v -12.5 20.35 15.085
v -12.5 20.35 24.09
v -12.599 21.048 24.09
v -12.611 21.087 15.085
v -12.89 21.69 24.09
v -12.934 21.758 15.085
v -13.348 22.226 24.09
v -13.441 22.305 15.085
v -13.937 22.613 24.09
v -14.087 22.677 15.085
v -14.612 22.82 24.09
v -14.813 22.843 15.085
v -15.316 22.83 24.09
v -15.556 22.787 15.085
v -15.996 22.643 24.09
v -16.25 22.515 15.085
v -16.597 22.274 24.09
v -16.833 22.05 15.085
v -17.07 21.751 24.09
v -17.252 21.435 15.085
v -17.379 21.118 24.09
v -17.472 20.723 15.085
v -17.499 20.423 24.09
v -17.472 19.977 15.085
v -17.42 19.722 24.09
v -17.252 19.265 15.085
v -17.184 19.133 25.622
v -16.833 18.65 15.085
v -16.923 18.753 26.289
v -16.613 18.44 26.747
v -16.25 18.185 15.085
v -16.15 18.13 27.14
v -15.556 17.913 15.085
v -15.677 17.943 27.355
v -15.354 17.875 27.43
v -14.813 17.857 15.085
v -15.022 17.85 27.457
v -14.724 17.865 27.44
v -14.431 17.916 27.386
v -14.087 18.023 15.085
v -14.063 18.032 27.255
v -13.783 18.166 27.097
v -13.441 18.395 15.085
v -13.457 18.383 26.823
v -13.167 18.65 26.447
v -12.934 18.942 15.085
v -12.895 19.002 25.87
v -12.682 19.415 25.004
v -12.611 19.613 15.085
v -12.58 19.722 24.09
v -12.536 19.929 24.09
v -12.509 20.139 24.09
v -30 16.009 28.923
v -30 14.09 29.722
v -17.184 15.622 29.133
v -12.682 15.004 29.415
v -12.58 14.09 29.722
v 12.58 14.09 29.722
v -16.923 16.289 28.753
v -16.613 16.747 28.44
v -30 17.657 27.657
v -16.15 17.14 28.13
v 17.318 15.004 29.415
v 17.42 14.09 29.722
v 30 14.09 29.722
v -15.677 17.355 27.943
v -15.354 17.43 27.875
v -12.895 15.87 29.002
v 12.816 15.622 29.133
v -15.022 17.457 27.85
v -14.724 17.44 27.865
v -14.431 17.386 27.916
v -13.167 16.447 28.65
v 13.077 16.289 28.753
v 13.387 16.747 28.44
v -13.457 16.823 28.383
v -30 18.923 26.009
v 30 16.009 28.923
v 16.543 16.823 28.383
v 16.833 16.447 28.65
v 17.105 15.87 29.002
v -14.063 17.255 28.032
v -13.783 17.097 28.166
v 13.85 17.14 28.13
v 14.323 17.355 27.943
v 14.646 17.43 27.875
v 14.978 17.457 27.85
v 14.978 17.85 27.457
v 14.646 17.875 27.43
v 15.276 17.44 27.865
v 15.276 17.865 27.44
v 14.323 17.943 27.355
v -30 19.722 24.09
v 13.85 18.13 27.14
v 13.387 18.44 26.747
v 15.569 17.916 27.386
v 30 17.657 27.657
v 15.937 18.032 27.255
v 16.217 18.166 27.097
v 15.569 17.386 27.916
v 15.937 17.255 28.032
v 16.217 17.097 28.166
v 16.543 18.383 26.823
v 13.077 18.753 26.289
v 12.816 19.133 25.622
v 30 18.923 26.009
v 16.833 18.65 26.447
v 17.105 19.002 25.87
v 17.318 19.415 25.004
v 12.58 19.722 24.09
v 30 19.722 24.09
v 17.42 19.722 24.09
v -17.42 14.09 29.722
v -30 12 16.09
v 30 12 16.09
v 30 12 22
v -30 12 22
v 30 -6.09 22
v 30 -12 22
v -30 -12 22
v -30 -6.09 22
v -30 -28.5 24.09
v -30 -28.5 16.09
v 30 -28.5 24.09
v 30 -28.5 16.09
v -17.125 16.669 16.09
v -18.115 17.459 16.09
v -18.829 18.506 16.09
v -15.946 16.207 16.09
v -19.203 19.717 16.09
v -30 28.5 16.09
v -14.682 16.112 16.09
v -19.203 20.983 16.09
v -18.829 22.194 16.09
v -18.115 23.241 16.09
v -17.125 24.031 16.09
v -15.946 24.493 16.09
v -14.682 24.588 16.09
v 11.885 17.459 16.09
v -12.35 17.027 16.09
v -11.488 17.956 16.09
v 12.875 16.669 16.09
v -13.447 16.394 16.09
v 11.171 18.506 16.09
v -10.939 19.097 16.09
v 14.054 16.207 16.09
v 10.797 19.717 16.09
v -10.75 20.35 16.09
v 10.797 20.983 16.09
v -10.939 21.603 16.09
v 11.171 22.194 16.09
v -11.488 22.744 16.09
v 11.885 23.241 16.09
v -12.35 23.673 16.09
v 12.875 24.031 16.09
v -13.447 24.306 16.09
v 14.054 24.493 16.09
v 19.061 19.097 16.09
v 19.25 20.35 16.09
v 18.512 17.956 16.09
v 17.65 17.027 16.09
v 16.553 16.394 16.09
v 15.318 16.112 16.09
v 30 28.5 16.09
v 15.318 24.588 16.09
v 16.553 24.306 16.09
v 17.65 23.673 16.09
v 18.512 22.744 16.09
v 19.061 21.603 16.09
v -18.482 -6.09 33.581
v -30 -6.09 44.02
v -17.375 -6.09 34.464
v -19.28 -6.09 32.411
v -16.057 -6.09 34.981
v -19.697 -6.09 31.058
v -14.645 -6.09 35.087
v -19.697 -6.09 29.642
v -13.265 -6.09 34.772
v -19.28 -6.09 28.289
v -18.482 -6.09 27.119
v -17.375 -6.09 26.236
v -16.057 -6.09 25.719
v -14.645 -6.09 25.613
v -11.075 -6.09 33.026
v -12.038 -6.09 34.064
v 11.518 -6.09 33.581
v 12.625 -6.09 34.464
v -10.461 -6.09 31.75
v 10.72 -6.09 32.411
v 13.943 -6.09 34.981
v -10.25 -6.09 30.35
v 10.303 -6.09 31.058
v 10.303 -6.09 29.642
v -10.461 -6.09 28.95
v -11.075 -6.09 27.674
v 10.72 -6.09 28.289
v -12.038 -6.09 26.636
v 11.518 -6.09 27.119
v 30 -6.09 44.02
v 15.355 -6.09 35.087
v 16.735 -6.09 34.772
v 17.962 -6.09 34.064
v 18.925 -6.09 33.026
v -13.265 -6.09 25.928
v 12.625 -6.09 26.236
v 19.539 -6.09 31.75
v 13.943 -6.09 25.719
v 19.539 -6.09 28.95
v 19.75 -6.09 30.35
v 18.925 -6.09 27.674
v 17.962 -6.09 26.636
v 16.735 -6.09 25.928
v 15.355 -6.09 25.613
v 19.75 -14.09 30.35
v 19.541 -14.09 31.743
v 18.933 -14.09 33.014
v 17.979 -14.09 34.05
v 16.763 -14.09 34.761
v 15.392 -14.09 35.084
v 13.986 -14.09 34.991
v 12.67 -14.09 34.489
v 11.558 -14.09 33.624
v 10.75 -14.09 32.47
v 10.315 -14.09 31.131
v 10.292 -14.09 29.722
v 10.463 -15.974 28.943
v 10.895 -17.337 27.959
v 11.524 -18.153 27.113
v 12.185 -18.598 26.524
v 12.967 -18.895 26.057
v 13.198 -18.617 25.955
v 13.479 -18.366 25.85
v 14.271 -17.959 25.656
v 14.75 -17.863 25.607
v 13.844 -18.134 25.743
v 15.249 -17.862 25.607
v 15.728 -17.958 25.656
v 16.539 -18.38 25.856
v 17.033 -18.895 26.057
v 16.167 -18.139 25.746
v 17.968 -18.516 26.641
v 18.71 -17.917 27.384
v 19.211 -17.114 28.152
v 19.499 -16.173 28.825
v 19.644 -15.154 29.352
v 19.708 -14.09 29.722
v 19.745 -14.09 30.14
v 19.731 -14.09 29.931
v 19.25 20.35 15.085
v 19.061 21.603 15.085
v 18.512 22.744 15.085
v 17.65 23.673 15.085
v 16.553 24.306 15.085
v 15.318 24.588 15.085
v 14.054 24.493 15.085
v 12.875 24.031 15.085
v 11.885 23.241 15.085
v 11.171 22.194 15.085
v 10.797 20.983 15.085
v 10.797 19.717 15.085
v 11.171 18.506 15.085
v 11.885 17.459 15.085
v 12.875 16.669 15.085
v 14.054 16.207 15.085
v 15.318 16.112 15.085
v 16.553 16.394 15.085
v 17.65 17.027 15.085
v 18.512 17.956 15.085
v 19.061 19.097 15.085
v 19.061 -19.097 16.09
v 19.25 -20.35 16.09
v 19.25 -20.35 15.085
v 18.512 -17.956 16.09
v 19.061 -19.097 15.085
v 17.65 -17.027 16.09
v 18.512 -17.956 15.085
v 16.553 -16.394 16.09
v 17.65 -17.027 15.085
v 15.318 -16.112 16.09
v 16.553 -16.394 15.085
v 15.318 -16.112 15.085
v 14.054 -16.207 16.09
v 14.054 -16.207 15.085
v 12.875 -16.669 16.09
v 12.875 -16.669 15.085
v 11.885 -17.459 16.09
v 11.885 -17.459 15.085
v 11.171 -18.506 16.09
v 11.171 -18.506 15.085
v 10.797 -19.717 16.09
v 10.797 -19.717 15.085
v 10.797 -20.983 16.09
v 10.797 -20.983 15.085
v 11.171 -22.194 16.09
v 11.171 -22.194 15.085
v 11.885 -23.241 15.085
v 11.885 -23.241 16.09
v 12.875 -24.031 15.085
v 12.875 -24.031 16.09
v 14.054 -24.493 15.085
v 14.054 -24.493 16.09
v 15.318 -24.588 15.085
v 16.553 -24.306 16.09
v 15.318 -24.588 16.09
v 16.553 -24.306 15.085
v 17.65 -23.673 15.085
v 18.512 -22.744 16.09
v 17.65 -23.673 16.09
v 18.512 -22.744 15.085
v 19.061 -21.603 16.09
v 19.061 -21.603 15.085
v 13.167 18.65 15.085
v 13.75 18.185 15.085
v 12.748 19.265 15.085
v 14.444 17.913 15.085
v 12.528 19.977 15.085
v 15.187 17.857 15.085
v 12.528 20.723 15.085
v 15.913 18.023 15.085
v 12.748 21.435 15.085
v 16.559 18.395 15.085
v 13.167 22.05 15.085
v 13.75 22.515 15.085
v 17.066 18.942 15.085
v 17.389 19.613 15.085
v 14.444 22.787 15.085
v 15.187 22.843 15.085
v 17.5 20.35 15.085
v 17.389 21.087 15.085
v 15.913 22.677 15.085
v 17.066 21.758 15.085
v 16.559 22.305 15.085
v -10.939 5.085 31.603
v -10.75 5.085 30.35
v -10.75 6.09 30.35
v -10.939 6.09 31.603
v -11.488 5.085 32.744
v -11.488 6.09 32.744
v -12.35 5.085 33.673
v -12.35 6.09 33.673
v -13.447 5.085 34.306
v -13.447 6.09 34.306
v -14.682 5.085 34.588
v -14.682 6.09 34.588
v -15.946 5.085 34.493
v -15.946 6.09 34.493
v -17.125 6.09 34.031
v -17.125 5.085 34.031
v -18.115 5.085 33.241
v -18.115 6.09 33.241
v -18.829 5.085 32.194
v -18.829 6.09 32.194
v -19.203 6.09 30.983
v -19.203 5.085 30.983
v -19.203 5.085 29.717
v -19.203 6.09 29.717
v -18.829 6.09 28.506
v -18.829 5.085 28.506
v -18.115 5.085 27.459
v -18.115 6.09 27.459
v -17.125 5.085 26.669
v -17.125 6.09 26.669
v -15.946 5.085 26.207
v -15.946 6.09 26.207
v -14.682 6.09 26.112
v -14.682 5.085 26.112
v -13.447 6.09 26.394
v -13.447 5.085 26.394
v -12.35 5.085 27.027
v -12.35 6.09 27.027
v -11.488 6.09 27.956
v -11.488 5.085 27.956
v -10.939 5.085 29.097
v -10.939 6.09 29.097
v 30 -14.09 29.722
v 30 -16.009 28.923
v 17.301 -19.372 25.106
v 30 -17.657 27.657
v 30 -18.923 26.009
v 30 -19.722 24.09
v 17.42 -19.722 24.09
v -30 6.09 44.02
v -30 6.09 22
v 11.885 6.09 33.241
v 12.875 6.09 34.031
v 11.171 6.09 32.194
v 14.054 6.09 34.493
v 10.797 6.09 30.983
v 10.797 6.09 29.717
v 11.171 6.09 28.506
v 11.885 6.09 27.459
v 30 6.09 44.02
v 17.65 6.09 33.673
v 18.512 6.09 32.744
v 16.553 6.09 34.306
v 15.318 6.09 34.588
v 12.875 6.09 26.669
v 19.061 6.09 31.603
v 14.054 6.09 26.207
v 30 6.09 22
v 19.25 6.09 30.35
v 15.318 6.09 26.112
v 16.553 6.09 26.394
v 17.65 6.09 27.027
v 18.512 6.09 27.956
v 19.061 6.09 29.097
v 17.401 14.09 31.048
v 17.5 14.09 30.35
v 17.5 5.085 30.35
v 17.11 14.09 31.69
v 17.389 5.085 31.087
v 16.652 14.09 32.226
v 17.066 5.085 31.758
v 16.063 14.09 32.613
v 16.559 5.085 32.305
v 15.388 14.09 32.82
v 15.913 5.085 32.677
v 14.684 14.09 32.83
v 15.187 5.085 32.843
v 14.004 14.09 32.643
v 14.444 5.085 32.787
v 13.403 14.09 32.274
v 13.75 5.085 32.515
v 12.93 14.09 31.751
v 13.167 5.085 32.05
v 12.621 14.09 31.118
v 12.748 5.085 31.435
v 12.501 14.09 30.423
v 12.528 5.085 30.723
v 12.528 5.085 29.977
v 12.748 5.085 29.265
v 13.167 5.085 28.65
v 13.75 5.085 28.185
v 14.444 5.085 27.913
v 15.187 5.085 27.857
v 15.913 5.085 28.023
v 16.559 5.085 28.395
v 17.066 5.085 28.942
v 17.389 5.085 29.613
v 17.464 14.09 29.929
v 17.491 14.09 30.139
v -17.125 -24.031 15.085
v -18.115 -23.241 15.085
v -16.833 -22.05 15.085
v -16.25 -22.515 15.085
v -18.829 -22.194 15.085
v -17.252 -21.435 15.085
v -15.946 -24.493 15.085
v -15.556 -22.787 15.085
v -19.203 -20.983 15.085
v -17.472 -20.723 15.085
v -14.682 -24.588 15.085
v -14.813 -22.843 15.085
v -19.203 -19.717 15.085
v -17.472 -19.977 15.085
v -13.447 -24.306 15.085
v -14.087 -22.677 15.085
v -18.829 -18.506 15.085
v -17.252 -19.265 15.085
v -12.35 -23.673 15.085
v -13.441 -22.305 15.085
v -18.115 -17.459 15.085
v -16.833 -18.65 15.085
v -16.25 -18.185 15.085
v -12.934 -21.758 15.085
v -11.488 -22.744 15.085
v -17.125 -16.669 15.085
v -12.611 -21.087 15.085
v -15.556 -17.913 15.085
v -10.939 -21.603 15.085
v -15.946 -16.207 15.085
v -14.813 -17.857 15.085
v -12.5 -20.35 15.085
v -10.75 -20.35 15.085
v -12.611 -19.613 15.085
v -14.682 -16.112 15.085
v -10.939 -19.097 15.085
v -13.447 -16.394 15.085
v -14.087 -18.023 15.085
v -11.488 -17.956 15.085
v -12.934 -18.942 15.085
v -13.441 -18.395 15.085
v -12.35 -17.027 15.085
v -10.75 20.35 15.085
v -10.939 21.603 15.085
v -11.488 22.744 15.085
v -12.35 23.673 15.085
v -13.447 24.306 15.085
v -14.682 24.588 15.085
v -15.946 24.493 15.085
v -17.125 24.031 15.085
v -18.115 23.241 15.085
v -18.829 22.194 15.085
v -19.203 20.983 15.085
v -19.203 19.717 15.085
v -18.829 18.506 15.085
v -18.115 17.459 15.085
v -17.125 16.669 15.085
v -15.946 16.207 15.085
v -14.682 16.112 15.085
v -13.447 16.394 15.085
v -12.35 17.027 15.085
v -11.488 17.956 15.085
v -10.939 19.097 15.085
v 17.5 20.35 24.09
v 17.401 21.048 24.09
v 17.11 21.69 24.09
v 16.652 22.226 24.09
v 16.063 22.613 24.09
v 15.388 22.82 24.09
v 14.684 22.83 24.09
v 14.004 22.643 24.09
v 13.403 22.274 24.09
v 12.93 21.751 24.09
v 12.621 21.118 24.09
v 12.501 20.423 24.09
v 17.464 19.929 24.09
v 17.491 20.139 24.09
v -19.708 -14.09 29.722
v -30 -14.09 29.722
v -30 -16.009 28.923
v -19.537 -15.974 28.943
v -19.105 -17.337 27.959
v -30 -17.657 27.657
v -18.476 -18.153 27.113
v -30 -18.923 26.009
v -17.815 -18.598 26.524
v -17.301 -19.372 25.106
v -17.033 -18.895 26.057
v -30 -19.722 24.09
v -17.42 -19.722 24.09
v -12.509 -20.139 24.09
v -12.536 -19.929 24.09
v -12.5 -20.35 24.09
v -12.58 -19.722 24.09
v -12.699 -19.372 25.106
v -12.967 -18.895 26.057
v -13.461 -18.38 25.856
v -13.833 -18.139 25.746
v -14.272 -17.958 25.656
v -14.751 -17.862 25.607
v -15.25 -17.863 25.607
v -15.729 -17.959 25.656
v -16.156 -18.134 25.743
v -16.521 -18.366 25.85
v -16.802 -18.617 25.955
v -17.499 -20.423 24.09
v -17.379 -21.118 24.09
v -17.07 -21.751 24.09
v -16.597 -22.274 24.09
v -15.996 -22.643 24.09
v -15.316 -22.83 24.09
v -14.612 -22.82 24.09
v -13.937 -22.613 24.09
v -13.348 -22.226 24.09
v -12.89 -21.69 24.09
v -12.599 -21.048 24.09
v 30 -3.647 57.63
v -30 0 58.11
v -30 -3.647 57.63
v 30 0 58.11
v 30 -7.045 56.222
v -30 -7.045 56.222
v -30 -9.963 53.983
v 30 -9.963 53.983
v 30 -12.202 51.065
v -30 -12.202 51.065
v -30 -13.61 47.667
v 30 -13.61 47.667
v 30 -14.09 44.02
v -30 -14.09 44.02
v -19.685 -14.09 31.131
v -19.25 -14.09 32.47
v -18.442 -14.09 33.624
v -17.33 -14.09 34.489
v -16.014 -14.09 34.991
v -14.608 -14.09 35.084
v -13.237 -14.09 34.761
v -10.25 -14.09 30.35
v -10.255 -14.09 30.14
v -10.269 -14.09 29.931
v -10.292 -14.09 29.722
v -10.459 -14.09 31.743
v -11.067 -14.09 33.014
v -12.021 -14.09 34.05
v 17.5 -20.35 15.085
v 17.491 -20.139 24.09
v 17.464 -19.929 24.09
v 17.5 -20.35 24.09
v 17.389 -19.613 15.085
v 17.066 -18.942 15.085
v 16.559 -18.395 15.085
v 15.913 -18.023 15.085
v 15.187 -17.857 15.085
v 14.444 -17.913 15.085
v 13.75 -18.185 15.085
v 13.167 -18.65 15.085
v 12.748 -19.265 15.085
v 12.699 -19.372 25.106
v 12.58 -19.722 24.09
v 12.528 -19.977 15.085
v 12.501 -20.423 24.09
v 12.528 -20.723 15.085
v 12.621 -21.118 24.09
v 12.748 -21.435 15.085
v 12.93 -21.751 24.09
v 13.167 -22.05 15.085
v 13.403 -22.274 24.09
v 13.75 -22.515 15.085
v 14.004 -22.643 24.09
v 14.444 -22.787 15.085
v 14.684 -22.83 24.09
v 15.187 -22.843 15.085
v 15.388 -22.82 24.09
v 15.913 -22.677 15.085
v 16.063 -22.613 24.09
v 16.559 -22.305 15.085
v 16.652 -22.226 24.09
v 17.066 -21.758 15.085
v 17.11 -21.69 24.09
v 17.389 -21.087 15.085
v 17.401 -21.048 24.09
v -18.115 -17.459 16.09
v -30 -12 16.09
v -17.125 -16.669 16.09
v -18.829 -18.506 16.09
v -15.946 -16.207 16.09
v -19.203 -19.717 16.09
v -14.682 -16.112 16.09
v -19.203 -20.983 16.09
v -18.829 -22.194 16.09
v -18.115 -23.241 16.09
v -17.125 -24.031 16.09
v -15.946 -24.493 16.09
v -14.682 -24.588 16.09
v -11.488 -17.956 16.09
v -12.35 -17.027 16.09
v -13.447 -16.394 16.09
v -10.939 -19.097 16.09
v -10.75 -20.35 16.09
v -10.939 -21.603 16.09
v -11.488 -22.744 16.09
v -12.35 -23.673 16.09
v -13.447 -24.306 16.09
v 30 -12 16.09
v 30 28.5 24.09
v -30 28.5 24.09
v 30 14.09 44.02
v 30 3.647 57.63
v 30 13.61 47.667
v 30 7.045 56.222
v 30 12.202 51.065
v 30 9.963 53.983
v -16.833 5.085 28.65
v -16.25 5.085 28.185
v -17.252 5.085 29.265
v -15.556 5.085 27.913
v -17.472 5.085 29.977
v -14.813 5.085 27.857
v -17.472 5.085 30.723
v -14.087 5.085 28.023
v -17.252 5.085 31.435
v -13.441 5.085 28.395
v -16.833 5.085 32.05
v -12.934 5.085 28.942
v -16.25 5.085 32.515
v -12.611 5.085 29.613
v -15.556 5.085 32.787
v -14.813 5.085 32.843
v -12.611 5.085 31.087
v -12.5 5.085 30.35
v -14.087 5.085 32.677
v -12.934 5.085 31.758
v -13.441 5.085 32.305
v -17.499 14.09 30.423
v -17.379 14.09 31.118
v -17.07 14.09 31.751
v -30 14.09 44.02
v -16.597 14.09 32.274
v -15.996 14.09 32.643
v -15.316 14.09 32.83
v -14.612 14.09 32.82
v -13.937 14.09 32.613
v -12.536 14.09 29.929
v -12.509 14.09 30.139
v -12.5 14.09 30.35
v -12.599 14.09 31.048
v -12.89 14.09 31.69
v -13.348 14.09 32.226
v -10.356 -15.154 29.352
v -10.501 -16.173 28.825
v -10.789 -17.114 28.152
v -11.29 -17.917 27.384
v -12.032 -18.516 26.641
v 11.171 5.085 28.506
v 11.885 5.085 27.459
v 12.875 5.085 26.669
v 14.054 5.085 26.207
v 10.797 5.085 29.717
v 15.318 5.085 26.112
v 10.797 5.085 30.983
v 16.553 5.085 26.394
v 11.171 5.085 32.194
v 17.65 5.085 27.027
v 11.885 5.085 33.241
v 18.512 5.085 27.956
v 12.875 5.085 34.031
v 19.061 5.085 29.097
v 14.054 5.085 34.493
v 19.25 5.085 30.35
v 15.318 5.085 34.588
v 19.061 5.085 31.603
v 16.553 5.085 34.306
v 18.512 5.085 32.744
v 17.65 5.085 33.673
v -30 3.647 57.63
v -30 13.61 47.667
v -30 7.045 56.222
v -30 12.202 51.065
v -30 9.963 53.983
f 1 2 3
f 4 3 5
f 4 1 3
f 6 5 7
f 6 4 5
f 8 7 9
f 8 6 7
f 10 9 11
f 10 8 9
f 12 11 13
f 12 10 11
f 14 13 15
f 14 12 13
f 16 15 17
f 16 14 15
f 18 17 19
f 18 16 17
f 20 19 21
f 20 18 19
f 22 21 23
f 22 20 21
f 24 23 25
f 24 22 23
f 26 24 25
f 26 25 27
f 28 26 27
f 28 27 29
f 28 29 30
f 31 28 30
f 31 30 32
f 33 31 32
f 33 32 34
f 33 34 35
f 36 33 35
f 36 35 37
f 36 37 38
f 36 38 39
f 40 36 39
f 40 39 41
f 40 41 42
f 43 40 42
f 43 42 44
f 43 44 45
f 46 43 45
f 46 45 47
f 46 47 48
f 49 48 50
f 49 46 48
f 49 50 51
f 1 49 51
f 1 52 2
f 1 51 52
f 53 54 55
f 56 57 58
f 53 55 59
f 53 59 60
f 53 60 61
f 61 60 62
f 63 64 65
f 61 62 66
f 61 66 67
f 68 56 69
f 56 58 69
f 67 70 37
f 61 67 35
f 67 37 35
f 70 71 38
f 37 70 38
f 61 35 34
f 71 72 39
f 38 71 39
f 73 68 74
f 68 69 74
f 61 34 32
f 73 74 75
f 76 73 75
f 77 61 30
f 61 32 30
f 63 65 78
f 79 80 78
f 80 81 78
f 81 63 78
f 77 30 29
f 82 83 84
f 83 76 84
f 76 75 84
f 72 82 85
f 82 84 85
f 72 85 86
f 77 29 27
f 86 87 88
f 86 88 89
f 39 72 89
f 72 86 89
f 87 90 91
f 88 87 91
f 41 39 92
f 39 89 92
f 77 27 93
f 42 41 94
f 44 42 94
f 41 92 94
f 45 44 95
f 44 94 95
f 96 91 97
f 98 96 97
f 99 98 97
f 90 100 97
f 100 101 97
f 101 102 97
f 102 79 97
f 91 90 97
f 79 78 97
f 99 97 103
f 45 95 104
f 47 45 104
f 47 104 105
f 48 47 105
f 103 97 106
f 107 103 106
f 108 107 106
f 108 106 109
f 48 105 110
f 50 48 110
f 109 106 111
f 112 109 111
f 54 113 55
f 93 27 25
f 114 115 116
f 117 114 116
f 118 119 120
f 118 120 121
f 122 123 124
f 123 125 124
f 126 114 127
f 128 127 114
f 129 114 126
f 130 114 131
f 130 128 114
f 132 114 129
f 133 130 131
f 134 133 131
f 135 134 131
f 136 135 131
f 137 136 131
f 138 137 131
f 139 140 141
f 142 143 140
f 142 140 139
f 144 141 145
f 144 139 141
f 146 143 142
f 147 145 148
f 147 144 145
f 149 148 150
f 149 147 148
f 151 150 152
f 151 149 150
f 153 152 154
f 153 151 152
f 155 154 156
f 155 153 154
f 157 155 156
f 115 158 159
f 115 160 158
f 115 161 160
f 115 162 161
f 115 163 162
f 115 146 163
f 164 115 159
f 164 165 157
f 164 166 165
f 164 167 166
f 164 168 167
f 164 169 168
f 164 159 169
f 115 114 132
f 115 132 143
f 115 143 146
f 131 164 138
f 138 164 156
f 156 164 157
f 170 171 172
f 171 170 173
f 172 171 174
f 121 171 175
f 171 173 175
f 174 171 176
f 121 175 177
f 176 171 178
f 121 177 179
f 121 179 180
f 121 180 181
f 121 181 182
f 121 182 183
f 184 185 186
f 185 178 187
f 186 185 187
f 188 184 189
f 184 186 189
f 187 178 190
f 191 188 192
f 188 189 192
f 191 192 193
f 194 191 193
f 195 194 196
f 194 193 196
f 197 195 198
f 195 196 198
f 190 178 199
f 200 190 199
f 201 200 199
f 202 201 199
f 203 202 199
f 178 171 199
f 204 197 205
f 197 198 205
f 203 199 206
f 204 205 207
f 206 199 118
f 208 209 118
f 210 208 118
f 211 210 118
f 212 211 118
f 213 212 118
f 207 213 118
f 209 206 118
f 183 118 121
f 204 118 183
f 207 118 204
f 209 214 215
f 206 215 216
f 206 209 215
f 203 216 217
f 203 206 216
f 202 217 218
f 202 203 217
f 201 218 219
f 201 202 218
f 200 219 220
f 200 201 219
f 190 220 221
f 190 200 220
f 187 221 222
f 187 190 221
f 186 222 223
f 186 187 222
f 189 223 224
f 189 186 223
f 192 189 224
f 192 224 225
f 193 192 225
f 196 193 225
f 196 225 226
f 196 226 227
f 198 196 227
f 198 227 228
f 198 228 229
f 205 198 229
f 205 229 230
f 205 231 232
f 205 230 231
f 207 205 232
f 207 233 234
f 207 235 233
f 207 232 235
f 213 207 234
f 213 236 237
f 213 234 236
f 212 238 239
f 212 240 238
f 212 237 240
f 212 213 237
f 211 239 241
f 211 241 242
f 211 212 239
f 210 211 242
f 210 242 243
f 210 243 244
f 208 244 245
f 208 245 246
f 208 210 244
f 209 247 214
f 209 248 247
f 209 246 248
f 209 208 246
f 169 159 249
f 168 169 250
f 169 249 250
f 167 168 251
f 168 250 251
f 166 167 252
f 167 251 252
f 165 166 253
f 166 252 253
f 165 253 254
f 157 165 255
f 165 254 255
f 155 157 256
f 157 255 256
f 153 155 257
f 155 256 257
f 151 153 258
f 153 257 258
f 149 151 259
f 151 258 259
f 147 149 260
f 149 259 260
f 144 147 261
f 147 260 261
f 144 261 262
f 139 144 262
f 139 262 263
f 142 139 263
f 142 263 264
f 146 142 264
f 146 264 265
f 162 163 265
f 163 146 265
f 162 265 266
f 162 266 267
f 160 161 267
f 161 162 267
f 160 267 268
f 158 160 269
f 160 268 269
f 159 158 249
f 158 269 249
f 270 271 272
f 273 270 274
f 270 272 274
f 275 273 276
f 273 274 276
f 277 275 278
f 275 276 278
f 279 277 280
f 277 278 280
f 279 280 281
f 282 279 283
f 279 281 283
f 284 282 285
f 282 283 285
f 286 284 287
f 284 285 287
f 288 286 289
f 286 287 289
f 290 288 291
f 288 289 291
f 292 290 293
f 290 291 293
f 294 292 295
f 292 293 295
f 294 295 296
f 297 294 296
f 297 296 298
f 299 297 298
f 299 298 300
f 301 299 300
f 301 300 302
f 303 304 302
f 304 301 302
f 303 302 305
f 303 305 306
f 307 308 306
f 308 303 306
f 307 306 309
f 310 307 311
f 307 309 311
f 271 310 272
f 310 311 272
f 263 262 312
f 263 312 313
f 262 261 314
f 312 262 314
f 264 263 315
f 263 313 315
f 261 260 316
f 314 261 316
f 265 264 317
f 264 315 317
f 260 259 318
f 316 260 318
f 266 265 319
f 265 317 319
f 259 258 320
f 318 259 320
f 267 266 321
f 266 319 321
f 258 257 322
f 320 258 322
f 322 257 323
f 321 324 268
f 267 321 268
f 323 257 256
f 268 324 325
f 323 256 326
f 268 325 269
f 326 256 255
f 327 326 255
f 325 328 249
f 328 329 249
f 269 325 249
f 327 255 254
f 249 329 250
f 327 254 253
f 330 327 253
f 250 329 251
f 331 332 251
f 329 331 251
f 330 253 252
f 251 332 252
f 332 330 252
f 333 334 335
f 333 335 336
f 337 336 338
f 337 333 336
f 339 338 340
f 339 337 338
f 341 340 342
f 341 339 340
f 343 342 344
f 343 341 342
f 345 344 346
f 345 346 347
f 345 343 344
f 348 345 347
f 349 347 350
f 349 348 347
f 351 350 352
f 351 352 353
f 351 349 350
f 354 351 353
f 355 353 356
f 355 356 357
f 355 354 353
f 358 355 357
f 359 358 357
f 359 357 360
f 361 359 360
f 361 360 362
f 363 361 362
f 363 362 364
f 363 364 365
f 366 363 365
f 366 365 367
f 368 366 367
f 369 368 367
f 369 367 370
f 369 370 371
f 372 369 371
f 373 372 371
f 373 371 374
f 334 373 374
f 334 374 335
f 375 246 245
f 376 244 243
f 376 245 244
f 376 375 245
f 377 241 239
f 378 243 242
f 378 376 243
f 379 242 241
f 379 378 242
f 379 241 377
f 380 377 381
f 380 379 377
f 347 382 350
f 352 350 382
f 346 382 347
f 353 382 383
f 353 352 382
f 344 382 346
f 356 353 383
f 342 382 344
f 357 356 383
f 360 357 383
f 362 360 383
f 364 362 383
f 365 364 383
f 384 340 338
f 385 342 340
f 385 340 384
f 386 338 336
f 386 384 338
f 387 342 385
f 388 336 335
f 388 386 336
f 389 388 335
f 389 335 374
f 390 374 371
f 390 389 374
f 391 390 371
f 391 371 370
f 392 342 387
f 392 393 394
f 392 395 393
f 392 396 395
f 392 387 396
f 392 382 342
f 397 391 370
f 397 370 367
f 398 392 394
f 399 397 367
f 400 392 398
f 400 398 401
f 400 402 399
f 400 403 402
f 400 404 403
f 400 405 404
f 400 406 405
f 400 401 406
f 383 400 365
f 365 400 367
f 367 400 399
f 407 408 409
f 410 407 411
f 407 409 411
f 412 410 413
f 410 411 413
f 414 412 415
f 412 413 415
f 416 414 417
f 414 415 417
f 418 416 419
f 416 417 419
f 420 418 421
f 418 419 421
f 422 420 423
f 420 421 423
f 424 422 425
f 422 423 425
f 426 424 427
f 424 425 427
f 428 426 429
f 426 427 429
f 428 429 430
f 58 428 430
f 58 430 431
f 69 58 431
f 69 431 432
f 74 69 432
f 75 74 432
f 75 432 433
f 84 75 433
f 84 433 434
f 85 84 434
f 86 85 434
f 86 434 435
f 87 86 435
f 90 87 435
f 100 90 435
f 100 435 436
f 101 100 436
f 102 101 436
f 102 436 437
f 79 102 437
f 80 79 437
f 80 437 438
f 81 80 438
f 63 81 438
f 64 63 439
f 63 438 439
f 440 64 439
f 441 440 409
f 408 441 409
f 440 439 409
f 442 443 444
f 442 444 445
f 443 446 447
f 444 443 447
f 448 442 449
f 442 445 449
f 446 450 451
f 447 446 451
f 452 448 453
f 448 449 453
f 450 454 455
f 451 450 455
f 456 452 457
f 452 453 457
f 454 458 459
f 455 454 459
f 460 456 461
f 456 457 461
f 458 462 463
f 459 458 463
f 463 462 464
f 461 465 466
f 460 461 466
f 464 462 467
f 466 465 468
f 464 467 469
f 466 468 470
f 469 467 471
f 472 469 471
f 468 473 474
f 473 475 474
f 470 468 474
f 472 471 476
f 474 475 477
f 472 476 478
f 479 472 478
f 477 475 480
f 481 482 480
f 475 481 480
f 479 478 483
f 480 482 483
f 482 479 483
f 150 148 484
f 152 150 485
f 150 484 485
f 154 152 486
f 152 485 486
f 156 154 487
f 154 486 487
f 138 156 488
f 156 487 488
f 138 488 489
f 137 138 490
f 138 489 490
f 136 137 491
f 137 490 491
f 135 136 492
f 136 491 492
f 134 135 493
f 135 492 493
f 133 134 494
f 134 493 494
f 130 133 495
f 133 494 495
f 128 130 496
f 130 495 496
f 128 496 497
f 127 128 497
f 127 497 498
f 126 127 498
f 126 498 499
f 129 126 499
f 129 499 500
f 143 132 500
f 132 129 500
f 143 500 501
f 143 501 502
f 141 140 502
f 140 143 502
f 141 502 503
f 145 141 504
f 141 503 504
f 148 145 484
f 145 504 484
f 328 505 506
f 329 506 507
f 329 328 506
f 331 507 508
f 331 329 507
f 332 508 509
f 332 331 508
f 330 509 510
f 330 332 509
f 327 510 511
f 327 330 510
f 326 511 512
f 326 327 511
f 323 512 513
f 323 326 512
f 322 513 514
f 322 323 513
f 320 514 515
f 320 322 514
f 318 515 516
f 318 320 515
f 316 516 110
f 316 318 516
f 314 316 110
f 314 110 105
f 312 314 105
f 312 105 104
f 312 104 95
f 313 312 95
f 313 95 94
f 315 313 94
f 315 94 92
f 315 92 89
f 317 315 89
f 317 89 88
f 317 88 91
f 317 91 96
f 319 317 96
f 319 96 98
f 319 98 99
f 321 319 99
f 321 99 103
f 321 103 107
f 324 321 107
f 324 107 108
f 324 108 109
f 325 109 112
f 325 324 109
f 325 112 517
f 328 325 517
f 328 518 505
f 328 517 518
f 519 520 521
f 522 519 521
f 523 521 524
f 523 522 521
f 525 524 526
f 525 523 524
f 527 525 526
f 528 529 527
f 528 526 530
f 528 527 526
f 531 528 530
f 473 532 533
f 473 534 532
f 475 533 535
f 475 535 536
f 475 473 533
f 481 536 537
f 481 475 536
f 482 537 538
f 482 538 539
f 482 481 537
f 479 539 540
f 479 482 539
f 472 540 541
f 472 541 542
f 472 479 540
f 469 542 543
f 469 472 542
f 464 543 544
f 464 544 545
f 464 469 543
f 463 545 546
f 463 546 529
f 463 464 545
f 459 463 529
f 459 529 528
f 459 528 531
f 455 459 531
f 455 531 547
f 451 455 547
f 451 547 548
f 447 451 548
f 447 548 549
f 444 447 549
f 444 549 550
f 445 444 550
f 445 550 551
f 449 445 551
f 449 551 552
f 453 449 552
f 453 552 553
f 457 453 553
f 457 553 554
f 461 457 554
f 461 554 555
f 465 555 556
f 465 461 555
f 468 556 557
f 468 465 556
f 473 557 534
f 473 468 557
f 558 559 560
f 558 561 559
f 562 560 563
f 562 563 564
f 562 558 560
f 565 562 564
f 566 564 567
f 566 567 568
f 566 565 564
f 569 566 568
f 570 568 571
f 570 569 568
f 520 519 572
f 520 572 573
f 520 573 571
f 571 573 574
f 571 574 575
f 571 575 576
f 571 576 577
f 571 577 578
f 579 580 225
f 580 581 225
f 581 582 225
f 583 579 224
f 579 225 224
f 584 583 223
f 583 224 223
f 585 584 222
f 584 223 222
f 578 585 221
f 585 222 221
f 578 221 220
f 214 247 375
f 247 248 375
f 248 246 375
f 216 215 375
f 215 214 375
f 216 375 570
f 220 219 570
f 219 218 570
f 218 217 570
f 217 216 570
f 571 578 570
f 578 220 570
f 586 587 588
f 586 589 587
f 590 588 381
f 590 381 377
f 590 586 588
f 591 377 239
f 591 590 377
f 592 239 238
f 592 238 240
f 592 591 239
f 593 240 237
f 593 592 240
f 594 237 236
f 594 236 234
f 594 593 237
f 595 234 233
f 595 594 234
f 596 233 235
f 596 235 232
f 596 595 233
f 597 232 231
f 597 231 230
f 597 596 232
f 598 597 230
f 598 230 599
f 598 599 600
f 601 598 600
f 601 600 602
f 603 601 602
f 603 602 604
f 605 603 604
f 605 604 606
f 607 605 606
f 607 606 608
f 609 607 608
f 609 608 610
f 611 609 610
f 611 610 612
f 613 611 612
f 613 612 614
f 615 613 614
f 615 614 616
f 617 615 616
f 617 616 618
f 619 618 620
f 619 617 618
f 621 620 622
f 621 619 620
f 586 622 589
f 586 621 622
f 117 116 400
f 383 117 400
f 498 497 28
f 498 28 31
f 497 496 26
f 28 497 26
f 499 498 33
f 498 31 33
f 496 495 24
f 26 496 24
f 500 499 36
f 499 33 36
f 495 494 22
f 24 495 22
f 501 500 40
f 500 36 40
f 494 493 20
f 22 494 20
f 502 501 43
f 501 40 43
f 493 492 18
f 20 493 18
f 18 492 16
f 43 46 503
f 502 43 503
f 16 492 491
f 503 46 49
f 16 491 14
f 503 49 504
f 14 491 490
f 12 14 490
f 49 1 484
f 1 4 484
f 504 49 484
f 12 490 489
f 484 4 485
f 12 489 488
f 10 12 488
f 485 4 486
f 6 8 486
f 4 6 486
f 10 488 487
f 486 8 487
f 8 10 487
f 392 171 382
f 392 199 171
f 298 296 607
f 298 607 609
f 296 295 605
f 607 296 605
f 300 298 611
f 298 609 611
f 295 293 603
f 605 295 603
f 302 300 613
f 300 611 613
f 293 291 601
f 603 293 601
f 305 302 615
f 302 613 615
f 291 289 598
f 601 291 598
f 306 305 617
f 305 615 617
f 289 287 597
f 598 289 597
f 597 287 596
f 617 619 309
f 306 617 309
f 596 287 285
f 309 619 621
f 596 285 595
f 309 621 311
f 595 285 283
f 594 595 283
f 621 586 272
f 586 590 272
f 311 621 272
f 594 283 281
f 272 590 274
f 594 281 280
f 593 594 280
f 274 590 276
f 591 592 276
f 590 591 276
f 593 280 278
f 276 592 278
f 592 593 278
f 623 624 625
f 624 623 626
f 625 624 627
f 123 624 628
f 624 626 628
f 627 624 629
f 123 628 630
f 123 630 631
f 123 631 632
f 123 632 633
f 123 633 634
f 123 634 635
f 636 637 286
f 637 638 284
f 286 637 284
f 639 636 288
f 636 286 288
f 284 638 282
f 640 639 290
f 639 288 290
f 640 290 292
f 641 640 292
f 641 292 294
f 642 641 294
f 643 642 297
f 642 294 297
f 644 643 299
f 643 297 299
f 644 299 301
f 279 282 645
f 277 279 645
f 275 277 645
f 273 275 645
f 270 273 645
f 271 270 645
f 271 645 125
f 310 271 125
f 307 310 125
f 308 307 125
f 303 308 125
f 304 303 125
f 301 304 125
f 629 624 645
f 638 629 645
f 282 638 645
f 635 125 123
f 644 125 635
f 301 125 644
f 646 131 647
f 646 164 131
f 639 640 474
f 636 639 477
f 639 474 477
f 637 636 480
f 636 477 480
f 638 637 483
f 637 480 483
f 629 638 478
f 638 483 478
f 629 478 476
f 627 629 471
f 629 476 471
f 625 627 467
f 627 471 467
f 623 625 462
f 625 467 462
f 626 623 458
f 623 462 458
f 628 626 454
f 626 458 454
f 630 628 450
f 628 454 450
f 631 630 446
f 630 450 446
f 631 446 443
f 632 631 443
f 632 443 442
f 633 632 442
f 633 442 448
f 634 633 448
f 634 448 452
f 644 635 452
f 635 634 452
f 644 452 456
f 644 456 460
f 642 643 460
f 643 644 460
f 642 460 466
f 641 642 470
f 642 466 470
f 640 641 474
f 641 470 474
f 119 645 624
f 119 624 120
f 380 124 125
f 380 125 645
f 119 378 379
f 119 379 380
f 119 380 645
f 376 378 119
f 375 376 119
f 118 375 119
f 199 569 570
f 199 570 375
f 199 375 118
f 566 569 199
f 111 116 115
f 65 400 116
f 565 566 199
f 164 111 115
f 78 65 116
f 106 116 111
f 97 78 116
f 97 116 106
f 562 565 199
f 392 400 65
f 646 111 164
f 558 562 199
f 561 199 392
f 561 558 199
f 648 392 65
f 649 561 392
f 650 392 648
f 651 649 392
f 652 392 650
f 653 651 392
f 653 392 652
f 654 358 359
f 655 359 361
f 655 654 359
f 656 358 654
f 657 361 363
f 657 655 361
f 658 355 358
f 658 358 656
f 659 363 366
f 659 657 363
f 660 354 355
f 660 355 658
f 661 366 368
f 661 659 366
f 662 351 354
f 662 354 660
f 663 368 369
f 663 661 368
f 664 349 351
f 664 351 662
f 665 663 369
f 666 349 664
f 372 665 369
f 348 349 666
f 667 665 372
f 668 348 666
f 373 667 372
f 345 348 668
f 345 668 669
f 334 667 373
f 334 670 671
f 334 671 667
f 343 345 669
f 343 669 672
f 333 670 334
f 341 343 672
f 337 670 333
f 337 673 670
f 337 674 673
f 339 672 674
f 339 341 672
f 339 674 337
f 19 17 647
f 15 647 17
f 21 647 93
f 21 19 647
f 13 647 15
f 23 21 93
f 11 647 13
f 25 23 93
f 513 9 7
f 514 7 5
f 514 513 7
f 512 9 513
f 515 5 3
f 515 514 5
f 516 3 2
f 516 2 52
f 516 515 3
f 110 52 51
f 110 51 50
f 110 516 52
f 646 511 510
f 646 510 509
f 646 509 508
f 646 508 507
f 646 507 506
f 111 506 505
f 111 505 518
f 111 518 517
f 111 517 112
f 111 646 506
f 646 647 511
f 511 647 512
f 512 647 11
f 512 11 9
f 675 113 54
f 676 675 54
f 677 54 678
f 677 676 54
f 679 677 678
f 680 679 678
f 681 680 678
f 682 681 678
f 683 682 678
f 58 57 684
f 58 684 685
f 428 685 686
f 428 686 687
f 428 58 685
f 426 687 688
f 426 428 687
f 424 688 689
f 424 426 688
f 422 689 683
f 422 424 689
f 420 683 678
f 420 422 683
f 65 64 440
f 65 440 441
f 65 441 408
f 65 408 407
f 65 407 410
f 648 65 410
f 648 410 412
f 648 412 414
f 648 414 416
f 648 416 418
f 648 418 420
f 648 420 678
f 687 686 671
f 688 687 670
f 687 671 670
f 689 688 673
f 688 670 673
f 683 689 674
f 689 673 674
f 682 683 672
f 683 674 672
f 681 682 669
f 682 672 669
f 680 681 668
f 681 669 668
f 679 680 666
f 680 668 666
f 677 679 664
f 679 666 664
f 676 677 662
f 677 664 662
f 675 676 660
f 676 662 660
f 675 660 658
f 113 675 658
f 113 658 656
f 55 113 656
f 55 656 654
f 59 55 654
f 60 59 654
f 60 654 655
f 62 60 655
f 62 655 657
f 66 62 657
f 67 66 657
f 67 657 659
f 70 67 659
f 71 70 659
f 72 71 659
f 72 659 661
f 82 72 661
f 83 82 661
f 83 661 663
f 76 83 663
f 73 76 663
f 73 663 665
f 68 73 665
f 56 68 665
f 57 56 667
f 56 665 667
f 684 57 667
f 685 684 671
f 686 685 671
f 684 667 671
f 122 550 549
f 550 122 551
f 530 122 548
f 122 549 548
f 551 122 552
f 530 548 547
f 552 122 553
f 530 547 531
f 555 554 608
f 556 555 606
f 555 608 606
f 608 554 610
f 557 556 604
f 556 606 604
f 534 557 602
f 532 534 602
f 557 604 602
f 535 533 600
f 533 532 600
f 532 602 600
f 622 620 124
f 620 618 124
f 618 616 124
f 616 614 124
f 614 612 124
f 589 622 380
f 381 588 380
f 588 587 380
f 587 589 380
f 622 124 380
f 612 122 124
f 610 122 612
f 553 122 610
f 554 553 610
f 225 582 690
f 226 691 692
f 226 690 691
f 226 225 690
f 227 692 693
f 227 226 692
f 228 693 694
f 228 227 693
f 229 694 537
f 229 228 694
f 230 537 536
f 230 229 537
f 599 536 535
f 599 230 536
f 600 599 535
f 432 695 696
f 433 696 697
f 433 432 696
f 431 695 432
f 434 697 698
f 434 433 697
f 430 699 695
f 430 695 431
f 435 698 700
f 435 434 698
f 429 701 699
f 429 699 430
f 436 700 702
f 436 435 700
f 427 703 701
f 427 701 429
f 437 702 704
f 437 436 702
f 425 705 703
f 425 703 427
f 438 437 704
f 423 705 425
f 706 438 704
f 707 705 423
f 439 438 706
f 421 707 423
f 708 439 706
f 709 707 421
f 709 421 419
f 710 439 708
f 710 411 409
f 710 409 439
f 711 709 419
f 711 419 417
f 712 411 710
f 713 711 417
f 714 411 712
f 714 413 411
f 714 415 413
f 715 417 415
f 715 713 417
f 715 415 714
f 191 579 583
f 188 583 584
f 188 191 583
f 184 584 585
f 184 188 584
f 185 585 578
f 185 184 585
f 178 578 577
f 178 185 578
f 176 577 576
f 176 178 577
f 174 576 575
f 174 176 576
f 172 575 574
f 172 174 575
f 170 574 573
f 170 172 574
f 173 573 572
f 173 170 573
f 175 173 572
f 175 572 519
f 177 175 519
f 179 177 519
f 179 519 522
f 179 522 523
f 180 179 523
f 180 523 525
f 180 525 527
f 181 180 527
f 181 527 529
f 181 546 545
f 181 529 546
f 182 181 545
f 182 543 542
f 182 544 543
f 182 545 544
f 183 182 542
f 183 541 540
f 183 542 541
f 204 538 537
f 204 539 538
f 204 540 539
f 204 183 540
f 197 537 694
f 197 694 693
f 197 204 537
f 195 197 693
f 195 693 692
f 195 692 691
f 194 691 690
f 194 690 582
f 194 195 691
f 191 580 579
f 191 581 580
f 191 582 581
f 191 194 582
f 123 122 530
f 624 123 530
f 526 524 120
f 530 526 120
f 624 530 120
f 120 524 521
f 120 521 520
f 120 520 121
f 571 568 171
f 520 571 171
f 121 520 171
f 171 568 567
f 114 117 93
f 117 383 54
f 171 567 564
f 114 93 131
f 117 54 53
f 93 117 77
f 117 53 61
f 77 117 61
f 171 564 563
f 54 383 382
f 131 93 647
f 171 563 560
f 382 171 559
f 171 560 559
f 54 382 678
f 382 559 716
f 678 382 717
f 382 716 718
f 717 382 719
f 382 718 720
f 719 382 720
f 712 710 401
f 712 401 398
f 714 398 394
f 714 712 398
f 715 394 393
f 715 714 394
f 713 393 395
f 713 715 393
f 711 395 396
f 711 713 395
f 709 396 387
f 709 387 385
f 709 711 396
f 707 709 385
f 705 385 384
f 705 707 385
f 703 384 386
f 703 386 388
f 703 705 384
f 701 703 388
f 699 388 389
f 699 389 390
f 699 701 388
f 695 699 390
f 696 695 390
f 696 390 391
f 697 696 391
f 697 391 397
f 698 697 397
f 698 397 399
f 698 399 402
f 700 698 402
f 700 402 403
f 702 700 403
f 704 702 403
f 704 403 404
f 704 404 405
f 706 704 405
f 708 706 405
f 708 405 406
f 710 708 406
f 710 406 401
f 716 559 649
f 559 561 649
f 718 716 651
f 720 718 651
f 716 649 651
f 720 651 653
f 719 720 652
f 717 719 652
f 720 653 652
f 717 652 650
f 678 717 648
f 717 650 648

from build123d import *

# Parameters (mm, degrees)
PAD003_DEPTH    = 30
SKETCH011_R     = 4.25
PAD004_DEPTH    = 2
SKETCH012_R     = 4.25
PAD005_DEPTH    = 2
SKETCH008_R     = 2.5
POCKET001_DEPTH = 28.501
SKETCH009_R     = 4.75
POCKET002_DEPTH = 28.501
SKETCH010_R     = 2.5
POCKET003_DEPTH = 48.111


with BuildPart() as part:
    # Sketch007 → Pad003 (new body, symmetric)
    with BuildSketch(Plane(origin=(0, 0, 10), x_dir=(0, 1, 0), z_dir=(1, 0, 0))):
        with BuildLine():
            Line((-12, 6.09), (-28.5, 6.09))
            Line((-28.5, 6.09), (-28.5, 14.09))
            Line((-28.5, 14.09), (-19.722169, 14.09))
            ThreePointArc((-14.09, 19.722169), (-17.656854, 17.656854), (-19.722169, 14.09))
            Line((-14.09, 19.722169), (-14.09, 34.02))
            ThreePointArc((0, 48.11), (-9.963135, 43.983135), (-14.09, 34.02))
            Line((0, 48.11), (0, 34.02))
            Line((0, 34.02), (-6.09, 34.02))
            Line((-6.09, 34.02), (-6.09, 12))
            Line((-12, 12), (-6.09, 12))
            Line((-12, 6.09), (-12, 12))
        make_face()
    pad003 = extrude(amount=PAD003_DEPTH, both=True)

    # Mirrored: Pad003 across Sketch007 V_Axis
    add(pad003.mirror(Plane(origin=(0, 0, 10), x_dir=(1, 0, 0), z_dir=(0, 1, 0))))

    # Sketch011 → Pad004 (join)
    with BuildSketch(Plane.XY.offset(15.085)):
        with Locations((-15, 20.35)):
            Circle(SKETCH011_R)
        with Locations((15, 20.35)):
            Circle(SKETCH011_R)
        with Locations((15, -20.35)):
            Circle(SKETCH011_R)
        with Locations((-15, -20.35)):
            Circle(SKETCH011_R)
    extrude(amount=PAD004_DEPTH)

    # Sketch012 → Pad005 (join)
    with BuildSketch(Plane(origin=(0, 5.085, 30.35), x_dir=(1, 0, 0), z_dir=(0, -1, 0))):
        with Locations((-15, 0)):
            Circle(SKETCH012_R)
        with Locations((15, 0)):
            Circle(SKETCH012_R)
    extrude(amount=-PAD005_DEPTH)

    # Sketch008 → Pocket001 (cut, through all)
    with BuildSketch(Plane(origin=(0, 0, 30.35), x_dir=(1, 0, 0), z_dir=(0, -1, 0))):
        with Locations((-15, 0)):
            Circle(SKETCH008_R)
        with Locations((15, 0)):
            Circle(SKETCH008_R)
    extrude(amount=-POCKET001_DEPTH, mode=Mode.SUBTRACT)

    # Sketch009 → Pocket002 (cut, through all)
    with BuildSketch(Plane(origin=(0, 0, 30.35), x_dir=(1, 0, 0), z_dir=(0, -1, 0))):
        with Locations((-15, 0)):
            Circle(SKETCH009_R)
        with Locations((15, 0)):
            Circle(SKETCH009_R)
    extrude(amount=POCKET002_DEPTH, mode=Mode.SUBTRACT)

    # Sketch010 → Pocket003 (cut, through all)
    with BuildSketch(Plane.XY.offset(10)):
        with Locations((-15, 20.35)):
            Circle(SKETCH010_R)
        with Locations((15, 20.35)):
            Circle(SKETCH010_R)
        with Locations((15, -20.35)):
            Circle(SKETCH010_R)
        with Locations((-15, -20.35)):
            Circle(SKETCH010_R)
    extrude(amount=POCKET003_DEPTH, mode=Mode.SUBTRACT)


solid = part.part
